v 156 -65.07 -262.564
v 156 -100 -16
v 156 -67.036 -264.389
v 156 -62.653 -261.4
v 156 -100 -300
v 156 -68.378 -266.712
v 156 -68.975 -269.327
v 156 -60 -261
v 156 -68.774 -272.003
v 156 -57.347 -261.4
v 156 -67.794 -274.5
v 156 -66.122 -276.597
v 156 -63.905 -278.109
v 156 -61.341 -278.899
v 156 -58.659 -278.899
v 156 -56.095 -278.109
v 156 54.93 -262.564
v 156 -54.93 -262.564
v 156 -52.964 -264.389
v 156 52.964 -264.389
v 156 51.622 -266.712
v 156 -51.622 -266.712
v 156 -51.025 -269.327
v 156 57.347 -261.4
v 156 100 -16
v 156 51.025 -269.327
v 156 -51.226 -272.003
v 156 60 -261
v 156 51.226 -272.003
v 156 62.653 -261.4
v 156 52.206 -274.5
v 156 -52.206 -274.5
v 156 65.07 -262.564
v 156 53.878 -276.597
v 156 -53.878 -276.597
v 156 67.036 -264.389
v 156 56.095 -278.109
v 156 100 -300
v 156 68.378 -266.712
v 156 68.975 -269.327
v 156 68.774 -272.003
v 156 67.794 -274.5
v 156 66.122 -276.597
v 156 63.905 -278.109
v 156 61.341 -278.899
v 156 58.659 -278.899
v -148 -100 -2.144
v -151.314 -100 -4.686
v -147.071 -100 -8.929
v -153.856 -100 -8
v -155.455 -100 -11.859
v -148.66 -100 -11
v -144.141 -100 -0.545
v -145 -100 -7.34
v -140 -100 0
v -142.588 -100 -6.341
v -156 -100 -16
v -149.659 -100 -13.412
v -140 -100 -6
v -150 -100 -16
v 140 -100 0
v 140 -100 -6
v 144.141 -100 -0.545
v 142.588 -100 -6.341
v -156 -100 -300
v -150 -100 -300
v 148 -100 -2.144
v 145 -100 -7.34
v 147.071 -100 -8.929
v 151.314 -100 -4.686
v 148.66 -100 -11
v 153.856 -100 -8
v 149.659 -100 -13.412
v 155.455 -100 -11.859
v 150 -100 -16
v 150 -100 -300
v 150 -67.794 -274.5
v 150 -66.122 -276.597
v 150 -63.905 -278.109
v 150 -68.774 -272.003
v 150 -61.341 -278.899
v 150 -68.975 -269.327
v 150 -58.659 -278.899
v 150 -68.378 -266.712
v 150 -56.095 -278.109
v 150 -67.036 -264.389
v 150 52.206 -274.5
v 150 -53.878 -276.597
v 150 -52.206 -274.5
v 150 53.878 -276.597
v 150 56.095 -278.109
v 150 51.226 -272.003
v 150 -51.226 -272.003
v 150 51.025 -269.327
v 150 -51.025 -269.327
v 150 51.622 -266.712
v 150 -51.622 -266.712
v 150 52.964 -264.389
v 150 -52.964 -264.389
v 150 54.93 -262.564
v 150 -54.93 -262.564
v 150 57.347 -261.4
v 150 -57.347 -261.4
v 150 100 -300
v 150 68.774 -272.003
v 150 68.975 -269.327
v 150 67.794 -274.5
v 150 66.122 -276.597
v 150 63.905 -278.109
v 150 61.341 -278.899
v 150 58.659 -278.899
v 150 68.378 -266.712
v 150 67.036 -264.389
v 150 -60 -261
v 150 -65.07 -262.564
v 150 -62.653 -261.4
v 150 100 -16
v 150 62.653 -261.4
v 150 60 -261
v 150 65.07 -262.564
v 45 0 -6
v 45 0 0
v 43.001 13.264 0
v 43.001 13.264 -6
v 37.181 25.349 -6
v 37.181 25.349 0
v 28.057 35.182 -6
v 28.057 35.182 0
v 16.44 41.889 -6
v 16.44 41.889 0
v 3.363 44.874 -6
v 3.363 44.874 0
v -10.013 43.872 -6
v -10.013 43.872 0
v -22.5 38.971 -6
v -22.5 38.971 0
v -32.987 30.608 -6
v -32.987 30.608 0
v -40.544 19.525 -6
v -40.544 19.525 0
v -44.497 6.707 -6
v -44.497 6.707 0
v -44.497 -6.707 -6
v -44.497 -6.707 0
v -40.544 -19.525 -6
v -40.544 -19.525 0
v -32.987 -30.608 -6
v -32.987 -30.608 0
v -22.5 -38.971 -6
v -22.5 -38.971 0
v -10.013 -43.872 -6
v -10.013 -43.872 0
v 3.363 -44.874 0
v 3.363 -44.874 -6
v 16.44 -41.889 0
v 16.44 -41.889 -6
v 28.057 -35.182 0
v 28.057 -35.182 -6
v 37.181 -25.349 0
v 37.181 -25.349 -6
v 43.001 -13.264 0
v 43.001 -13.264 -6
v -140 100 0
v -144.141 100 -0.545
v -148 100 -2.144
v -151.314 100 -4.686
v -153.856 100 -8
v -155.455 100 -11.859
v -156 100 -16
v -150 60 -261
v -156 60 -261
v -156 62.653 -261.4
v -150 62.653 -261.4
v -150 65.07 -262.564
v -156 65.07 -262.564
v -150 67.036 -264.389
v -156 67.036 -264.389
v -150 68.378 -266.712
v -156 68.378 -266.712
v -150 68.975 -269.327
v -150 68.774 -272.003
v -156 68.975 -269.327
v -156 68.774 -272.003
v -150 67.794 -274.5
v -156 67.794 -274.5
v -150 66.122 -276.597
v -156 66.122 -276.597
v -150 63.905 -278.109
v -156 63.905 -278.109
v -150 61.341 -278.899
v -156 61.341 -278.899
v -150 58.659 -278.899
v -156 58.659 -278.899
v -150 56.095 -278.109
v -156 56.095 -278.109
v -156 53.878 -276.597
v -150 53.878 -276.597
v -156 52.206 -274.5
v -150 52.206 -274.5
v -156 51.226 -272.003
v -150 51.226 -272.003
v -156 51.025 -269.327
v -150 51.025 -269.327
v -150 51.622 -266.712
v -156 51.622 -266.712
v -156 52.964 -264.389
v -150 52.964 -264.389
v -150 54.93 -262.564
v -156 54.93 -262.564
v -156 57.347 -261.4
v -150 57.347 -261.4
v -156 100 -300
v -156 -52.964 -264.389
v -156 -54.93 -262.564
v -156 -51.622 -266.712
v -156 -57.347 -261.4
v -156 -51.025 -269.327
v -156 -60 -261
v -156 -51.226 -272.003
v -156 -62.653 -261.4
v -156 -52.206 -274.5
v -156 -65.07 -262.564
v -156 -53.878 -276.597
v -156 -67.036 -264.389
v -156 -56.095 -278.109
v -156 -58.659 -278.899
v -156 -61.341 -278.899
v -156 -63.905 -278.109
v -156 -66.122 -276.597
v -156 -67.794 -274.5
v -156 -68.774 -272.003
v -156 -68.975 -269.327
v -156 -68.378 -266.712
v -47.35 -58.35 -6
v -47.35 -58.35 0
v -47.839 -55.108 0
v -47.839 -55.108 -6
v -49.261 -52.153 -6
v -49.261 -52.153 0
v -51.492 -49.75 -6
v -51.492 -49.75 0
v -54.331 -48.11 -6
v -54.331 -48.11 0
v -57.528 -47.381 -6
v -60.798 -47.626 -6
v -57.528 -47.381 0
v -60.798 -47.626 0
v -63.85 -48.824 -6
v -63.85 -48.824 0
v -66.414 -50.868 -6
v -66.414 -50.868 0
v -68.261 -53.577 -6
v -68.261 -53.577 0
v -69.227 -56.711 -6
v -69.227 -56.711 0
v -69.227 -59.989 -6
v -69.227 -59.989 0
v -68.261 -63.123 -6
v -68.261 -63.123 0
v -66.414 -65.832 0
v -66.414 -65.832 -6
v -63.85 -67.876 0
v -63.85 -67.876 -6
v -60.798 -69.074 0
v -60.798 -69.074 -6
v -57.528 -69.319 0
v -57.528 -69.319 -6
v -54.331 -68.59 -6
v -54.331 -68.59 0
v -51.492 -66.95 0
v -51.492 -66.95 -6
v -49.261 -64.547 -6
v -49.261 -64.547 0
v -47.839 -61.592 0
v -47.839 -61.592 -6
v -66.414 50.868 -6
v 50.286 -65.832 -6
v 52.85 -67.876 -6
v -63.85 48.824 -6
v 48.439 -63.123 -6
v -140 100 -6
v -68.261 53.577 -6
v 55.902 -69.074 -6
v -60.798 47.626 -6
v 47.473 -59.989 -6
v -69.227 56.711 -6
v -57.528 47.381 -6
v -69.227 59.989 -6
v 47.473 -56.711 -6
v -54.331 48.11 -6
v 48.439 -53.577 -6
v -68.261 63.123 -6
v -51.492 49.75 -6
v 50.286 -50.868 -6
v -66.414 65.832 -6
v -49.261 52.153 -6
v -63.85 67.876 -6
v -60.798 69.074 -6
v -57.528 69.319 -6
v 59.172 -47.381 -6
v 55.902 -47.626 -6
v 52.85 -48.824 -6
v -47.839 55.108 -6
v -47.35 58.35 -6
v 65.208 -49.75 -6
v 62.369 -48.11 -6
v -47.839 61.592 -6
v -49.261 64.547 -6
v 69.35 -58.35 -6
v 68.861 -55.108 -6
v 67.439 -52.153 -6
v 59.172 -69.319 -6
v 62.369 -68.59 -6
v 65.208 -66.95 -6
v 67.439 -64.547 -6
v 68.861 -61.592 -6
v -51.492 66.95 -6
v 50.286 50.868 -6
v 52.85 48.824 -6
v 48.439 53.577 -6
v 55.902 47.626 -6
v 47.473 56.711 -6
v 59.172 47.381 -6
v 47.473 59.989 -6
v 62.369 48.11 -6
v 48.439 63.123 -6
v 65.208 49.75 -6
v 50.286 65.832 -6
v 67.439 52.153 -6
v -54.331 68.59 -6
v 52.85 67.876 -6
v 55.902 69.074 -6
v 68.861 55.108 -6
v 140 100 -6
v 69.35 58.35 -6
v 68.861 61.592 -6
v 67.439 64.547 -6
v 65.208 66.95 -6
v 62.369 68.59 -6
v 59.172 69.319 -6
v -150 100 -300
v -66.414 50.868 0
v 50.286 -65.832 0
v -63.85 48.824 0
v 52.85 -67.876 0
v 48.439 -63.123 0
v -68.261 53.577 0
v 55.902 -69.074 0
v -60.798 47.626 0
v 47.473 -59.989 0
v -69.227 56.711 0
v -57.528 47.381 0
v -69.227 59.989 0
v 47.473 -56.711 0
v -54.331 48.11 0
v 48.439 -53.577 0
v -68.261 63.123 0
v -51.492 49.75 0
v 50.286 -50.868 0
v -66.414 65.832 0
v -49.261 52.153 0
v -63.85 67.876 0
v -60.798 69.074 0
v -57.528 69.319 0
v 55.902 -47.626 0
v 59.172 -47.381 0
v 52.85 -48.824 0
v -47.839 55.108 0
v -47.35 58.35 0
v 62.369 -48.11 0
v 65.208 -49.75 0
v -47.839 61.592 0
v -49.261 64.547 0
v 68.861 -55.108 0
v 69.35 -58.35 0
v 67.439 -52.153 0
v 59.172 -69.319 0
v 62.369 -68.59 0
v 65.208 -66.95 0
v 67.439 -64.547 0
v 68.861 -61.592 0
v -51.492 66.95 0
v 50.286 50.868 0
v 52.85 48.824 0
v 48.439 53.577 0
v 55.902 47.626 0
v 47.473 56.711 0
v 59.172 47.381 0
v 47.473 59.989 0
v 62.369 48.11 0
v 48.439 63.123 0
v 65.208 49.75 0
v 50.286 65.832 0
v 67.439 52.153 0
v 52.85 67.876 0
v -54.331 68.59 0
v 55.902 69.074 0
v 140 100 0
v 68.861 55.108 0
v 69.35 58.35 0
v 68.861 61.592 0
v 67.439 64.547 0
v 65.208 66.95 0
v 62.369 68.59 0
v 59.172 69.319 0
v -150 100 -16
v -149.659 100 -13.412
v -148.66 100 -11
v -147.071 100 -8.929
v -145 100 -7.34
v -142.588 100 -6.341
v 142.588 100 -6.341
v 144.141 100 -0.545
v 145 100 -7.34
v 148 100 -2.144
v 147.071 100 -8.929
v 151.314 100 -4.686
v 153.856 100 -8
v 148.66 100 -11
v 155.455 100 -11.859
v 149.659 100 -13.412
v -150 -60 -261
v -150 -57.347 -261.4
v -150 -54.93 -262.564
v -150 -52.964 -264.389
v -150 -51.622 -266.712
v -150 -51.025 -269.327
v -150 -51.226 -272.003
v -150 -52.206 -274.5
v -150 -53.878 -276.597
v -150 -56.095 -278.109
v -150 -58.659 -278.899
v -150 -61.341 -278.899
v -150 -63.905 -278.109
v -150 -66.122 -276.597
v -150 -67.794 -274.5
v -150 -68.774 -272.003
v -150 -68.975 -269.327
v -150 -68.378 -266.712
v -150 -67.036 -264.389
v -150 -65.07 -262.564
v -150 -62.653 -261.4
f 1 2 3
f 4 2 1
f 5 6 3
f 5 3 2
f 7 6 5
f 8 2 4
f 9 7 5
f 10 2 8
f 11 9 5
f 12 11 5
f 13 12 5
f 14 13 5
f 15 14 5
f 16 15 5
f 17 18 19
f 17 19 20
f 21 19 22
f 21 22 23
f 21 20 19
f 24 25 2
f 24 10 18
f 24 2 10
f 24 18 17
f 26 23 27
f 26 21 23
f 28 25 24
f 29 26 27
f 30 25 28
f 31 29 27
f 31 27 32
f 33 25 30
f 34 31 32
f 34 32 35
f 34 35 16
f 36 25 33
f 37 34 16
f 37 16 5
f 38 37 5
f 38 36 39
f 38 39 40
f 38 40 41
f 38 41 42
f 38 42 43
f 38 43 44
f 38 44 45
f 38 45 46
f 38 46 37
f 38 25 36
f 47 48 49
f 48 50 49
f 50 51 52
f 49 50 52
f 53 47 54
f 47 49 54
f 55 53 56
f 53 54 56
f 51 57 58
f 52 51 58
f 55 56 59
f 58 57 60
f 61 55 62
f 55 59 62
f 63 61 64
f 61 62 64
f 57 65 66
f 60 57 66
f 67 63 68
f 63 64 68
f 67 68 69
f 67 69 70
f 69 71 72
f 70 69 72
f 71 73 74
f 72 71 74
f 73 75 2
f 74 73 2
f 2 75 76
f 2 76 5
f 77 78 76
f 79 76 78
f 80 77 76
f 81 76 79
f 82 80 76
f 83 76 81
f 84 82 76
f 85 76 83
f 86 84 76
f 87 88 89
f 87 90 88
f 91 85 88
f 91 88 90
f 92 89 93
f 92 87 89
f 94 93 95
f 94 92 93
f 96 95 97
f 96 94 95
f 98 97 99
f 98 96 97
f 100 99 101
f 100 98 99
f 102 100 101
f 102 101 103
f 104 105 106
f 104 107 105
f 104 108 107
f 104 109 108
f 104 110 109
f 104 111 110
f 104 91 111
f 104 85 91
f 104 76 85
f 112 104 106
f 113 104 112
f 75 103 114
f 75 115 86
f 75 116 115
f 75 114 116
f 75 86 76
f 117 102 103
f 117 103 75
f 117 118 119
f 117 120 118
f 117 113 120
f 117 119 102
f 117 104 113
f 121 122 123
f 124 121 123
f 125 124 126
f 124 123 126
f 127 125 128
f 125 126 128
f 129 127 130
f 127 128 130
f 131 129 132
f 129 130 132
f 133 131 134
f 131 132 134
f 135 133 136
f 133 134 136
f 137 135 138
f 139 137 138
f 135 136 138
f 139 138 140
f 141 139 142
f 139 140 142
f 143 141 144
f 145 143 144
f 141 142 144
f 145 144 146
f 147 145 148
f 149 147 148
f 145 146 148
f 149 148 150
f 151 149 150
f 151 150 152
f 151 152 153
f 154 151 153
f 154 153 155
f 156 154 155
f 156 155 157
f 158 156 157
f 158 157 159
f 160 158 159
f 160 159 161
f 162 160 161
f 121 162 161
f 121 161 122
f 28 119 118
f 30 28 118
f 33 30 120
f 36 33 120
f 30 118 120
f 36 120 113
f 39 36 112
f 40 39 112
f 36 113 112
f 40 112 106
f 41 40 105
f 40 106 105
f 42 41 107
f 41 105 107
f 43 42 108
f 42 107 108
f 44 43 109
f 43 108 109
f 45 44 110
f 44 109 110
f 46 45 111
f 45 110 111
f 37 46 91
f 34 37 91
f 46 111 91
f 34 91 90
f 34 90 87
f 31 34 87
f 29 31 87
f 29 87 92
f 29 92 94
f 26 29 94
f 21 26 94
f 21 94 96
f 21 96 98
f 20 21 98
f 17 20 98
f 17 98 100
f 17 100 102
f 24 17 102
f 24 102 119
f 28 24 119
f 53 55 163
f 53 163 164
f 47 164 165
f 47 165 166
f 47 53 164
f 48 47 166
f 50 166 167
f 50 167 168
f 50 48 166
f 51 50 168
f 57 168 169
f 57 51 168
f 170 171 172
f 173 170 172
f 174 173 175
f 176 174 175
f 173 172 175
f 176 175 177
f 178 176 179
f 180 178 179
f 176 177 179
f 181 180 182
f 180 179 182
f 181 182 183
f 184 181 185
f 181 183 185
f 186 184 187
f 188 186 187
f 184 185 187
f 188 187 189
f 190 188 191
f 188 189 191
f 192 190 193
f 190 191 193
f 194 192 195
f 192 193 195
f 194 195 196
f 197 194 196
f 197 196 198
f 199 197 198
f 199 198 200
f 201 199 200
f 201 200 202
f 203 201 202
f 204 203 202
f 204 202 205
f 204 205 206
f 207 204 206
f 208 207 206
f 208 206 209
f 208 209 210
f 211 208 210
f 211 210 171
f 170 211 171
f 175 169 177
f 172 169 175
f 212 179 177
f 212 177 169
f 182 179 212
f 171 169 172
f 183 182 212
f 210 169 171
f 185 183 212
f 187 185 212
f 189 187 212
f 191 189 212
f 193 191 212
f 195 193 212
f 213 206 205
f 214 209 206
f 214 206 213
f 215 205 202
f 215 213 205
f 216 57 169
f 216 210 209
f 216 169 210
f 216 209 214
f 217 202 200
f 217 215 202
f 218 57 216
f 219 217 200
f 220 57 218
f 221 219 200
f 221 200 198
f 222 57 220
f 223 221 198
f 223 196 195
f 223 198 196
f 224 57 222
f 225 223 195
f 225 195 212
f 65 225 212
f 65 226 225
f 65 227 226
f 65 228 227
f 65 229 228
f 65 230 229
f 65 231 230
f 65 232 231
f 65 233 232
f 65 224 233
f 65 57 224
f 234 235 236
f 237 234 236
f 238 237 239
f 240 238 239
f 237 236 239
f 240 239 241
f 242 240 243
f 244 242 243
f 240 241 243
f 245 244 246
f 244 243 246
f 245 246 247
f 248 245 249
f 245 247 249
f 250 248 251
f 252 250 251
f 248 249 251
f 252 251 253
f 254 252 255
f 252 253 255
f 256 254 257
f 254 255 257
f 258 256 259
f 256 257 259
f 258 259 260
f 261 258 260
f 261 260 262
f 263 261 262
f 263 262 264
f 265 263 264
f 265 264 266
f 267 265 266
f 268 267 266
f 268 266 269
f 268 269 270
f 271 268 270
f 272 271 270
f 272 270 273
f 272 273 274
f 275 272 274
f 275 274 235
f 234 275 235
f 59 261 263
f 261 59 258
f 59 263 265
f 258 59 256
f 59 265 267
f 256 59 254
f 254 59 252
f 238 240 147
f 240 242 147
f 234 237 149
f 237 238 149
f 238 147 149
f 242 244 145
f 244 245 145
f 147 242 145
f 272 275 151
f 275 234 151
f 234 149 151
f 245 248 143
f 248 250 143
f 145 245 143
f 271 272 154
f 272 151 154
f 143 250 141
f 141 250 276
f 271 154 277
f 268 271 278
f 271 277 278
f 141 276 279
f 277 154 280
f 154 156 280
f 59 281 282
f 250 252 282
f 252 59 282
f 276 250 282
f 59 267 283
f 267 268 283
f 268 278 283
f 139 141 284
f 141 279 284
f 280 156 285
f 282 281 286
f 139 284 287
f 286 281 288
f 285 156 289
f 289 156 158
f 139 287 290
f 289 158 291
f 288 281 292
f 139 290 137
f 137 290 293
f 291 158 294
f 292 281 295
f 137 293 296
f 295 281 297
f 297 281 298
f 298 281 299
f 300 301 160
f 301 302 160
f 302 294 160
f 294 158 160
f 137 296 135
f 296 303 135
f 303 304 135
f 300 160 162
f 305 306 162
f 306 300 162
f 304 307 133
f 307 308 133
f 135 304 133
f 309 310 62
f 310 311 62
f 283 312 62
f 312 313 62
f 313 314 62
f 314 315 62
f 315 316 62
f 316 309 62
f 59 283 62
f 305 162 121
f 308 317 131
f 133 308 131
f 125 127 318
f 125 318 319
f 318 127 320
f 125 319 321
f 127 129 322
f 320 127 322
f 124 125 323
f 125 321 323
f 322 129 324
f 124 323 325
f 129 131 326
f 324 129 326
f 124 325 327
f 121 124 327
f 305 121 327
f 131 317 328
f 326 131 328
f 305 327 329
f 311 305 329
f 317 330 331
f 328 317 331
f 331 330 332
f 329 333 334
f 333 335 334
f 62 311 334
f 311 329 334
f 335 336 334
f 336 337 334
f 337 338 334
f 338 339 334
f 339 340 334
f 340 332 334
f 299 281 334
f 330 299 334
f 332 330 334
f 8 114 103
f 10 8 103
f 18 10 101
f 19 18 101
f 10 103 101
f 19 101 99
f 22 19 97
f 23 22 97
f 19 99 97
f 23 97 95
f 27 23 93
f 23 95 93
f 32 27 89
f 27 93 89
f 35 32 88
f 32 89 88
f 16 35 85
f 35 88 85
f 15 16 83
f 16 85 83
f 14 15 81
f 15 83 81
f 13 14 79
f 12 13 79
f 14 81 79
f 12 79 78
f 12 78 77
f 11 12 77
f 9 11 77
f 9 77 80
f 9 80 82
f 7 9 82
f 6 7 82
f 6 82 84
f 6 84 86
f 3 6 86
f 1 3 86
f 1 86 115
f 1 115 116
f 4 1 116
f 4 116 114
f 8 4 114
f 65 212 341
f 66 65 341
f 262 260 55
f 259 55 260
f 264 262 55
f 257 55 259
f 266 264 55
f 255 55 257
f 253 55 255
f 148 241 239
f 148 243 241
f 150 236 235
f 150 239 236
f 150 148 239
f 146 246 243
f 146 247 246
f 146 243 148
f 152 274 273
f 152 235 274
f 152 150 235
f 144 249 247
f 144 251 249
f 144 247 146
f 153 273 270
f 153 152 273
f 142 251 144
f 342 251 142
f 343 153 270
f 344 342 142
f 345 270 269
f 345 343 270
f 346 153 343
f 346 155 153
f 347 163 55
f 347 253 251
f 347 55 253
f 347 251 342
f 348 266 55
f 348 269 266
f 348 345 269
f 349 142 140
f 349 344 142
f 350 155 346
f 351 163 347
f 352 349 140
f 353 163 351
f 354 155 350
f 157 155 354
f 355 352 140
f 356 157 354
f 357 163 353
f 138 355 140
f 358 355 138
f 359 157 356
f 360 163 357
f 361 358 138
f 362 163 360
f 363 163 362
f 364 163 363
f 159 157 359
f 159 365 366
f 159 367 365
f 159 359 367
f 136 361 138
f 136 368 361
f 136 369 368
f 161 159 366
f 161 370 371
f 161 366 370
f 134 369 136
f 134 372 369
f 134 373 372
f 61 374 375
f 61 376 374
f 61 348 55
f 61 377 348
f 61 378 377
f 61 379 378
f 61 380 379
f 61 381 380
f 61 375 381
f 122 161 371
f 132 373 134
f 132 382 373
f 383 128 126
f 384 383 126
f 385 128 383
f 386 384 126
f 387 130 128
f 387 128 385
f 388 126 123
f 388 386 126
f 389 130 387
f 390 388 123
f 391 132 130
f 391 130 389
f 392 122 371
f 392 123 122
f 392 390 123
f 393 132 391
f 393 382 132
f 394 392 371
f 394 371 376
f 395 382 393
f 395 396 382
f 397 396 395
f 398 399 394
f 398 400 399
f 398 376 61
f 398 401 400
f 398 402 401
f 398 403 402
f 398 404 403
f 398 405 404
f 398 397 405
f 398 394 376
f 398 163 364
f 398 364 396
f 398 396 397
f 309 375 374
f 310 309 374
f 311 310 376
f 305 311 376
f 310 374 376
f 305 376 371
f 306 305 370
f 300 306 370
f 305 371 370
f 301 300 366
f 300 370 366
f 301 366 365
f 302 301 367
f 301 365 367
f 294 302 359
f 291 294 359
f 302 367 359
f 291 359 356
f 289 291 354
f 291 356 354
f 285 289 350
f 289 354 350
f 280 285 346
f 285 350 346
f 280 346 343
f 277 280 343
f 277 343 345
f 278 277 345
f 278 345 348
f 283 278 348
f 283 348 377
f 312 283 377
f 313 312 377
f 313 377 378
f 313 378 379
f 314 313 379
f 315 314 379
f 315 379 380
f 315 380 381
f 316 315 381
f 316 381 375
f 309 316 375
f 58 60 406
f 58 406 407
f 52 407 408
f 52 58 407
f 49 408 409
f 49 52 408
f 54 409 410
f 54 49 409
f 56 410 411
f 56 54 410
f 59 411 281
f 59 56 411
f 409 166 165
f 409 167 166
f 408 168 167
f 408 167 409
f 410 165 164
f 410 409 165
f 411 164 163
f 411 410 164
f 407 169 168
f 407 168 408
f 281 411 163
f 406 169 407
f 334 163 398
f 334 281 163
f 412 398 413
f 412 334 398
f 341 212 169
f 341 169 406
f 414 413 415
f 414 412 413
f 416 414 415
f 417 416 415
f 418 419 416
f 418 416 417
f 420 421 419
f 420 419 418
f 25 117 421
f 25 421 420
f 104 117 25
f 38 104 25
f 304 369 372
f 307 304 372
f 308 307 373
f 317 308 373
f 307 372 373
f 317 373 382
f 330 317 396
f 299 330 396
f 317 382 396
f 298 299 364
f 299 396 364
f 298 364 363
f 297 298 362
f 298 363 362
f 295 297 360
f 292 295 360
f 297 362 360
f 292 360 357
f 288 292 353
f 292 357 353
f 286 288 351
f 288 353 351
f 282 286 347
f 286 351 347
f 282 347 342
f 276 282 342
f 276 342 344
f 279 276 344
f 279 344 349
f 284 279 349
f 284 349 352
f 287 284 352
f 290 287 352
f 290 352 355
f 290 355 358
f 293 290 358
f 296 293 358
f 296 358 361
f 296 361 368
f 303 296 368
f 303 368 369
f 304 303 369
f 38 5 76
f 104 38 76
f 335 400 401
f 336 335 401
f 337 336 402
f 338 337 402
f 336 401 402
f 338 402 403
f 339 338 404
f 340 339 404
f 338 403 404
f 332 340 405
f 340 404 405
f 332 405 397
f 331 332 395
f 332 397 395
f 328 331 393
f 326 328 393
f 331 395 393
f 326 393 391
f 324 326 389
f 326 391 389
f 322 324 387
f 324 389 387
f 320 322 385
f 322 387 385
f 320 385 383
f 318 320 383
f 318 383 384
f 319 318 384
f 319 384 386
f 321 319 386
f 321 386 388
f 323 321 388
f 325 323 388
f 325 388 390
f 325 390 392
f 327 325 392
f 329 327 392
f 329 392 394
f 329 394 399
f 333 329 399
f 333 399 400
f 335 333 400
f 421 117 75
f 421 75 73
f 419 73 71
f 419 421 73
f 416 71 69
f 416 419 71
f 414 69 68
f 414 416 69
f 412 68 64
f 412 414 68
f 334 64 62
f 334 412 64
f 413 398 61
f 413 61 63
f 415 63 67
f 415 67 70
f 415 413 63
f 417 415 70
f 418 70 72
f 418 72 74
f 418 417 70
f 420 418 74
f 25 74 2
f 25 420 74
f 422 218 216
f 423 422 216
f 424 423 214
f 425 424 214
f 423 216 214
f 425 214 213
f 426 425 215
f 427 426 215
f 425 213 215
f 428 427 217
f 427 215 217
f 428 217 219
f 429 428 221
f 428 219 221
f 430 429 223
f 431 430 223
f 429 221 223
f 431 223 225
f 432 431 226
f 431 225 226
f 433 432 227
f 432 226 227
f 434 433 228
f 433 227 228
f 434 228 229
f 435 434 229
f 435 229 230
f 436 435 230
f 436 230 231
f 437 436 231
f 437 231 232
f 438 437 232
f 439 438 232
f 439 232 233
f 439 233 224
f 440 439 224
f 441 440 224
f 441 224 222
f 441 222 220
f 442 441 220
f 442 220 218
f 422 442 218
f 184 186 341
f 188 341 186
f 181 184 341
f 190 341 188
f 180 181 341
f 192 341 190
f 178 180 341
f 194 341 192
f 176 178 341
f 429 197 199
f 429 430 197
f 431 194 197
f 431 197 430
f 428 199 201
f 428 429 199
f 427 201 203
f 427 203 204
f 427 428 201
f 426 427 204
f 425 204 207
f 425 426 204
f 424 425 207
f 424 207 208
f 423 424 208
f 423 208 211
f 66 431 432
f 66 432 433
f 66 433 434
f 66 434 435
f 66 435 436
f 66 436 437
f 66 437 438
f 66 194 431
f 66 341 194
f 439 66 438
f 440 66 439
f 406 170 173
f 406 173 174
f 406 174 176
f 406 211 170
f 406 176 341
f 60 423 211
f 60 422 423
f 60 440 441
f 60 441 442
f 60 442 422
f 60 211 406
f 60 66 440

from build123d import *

# Parameters (mm, degrees)
SKETCH1_W                    = 312
SKETCH1_H                    = 200
BASE_FLANGE1_DEPTH           = 6
EDGE_FLANGE1_STRIP_W         = 44
EDGE_FLANGE1_STRIP_H         = 6
EDGE_FLANGE1_STRIP_CUT_DEPTH = 200
EDGE_FLANGE1_DEPTH           = 200
EDGE_FLANGE2_STRIP_W         = 44
EDGE_FLANGE2_STRIP_H         = 6
EDGE_FLANGE2_STRIP_CUT_DEPTH = 200
EDGE_FLANGE2_DEPTH           = 200
SKETCH24_R                   = 45
CUT_EXTRUDE1_DEPTH           = 10
SKETCH27_R                   = 11
CUT_EXTRUDE4_DEPTH           = 10
SKETCH28_R                   = 9
CUT_EXTRUDE5_DEPTH           = 445.234172481


# Sheet-metal steps are written as plain solids
with BuildPart() as part:
    # Sketch1 → Base-Flange1 (new body)
    with BuildSketch(Plane.XY):
        Rectangle(SKETCH1_W, SKETCH1_H)
    extrude(amount=-BASE_FLANGE1_DEPTH)

    # Edge-Flange1 strip (across the edge) → Edge-Flange1 strip cut (cut)
    with BuildSketch(Plane(origin=(-156, -100, -6), x_dir=(1, 0, 0), z_dir=(0, 1, 0))):
        with Locations((-6, -3)):
            Rectangle(EDGE_FLANGE1_STRIP_W, EDGE_FLANGE1_STRIP_H)
    extrude(amount=EDGE_FLANGE1_STRIP_CUT_DEPTH, mode=Mode.SUBTRACT)

    # Edge-Flange1 section (across the edge) → Edge-Flange1 (add)
    with BuildSketch(Plane(origin=(-156, -100, -6), x_dir=(1, 0, 0), z_dir=(0, 1, 0))):
        with BuildLine():
            Line((0, 10), (0, 294))
            Line((0, 294), (6, 294))
            Line((6, 294), (6, 10))
            ThreePointArc((6, 10), (8.928932188, 2.928932188), (16, 0))
            Line((16, 0), (16, -6))
            ThreePointArc((16, -6), (4.686291501, -1.313708499), (0, 10))
        make_face()
    extrude(amount=EDGE_FLANGE1_DEPTH)

    # Edge-Flange2 strip (across the edge) → Edge-Flange2 strip cut (cut)
    with BuildSketch(Plane(origin=(156, 100, -6), x_dir=(-1, 0, 0), z_dir=(0, -1, 0))):
        with Locations((-6, -3)):
            Rectangle(EDGE_FLANGE2_STRIP_W, EDGE_FLANGE2_STRIP_H)
    extrude(amount=EDGE_FLANGE2_STRIP_CUT_DEPTH, mode=Mode.SUBTRACT)

    # Edge-Flange2 section (across the edge) → Edge-Flange2 (add)
    with BuildSketch(Plane(origin=(156, 100, -6), x_dir=(-1, 0, 0), z_dir=(0, -1, 0))):
        with BuildLine():
            Line((0, 10), (0, 294))
            Line((0, 294), (6, 294))
            Line((6, 294), (6, 10))
            ThreePointArc((6, 10), (8.928932188, 2.928932188), (16, 0))
            Line((16, 0), (16, -6))
            ThreePointArc((16, -6), (4.686291501, -1.313708499), (0, 10))
        make_face()
    extrude(amount=EDGE_FLANGE2_DEPTH)

    # Sketch24 → Cut-Extrude1 (cut)
    with BuildSketch(Plane.XY):
        Circle(SKETCH24_R)
    extrude(amount=-CUT_EXTRUDE1_DEPTH, mode=Mode.SUBTRACT)

    # Sketch27 → Cut-Extrude4 (cut)
    with BuildSketch(Plane.XY):
        with Locations((58.35, 58.35)):
            Circle(SKETCH27_R)
        with Locations((58.35, -58.35)):
            Circle(SKETCH27_R)
        with Locations((-58.35, -58.35)):
            Circle(SKETCH27_R)
        with Locations((-58.35, 58.35)):
            Circle(SKETCH27_R)
    extrude(amount=-CUT_EXTRUDE4_DEPTH, mode=Mode.SUBTRACT)

    # Sketch28 → Cut-Extrude5 (cut, through all)
    with BuildSketch(Plane.ZY.offset(156)):
        with Locations((-270, 60)):
            Circle(SKETCH28_R)
        with Locations((-270, -60)):
            Circle(SKETCH28_R)
    extrude(amount=-CUT_EXTRUDE5_DEPTH, mode=Mode.SUBTRACT)


solid = part.part
